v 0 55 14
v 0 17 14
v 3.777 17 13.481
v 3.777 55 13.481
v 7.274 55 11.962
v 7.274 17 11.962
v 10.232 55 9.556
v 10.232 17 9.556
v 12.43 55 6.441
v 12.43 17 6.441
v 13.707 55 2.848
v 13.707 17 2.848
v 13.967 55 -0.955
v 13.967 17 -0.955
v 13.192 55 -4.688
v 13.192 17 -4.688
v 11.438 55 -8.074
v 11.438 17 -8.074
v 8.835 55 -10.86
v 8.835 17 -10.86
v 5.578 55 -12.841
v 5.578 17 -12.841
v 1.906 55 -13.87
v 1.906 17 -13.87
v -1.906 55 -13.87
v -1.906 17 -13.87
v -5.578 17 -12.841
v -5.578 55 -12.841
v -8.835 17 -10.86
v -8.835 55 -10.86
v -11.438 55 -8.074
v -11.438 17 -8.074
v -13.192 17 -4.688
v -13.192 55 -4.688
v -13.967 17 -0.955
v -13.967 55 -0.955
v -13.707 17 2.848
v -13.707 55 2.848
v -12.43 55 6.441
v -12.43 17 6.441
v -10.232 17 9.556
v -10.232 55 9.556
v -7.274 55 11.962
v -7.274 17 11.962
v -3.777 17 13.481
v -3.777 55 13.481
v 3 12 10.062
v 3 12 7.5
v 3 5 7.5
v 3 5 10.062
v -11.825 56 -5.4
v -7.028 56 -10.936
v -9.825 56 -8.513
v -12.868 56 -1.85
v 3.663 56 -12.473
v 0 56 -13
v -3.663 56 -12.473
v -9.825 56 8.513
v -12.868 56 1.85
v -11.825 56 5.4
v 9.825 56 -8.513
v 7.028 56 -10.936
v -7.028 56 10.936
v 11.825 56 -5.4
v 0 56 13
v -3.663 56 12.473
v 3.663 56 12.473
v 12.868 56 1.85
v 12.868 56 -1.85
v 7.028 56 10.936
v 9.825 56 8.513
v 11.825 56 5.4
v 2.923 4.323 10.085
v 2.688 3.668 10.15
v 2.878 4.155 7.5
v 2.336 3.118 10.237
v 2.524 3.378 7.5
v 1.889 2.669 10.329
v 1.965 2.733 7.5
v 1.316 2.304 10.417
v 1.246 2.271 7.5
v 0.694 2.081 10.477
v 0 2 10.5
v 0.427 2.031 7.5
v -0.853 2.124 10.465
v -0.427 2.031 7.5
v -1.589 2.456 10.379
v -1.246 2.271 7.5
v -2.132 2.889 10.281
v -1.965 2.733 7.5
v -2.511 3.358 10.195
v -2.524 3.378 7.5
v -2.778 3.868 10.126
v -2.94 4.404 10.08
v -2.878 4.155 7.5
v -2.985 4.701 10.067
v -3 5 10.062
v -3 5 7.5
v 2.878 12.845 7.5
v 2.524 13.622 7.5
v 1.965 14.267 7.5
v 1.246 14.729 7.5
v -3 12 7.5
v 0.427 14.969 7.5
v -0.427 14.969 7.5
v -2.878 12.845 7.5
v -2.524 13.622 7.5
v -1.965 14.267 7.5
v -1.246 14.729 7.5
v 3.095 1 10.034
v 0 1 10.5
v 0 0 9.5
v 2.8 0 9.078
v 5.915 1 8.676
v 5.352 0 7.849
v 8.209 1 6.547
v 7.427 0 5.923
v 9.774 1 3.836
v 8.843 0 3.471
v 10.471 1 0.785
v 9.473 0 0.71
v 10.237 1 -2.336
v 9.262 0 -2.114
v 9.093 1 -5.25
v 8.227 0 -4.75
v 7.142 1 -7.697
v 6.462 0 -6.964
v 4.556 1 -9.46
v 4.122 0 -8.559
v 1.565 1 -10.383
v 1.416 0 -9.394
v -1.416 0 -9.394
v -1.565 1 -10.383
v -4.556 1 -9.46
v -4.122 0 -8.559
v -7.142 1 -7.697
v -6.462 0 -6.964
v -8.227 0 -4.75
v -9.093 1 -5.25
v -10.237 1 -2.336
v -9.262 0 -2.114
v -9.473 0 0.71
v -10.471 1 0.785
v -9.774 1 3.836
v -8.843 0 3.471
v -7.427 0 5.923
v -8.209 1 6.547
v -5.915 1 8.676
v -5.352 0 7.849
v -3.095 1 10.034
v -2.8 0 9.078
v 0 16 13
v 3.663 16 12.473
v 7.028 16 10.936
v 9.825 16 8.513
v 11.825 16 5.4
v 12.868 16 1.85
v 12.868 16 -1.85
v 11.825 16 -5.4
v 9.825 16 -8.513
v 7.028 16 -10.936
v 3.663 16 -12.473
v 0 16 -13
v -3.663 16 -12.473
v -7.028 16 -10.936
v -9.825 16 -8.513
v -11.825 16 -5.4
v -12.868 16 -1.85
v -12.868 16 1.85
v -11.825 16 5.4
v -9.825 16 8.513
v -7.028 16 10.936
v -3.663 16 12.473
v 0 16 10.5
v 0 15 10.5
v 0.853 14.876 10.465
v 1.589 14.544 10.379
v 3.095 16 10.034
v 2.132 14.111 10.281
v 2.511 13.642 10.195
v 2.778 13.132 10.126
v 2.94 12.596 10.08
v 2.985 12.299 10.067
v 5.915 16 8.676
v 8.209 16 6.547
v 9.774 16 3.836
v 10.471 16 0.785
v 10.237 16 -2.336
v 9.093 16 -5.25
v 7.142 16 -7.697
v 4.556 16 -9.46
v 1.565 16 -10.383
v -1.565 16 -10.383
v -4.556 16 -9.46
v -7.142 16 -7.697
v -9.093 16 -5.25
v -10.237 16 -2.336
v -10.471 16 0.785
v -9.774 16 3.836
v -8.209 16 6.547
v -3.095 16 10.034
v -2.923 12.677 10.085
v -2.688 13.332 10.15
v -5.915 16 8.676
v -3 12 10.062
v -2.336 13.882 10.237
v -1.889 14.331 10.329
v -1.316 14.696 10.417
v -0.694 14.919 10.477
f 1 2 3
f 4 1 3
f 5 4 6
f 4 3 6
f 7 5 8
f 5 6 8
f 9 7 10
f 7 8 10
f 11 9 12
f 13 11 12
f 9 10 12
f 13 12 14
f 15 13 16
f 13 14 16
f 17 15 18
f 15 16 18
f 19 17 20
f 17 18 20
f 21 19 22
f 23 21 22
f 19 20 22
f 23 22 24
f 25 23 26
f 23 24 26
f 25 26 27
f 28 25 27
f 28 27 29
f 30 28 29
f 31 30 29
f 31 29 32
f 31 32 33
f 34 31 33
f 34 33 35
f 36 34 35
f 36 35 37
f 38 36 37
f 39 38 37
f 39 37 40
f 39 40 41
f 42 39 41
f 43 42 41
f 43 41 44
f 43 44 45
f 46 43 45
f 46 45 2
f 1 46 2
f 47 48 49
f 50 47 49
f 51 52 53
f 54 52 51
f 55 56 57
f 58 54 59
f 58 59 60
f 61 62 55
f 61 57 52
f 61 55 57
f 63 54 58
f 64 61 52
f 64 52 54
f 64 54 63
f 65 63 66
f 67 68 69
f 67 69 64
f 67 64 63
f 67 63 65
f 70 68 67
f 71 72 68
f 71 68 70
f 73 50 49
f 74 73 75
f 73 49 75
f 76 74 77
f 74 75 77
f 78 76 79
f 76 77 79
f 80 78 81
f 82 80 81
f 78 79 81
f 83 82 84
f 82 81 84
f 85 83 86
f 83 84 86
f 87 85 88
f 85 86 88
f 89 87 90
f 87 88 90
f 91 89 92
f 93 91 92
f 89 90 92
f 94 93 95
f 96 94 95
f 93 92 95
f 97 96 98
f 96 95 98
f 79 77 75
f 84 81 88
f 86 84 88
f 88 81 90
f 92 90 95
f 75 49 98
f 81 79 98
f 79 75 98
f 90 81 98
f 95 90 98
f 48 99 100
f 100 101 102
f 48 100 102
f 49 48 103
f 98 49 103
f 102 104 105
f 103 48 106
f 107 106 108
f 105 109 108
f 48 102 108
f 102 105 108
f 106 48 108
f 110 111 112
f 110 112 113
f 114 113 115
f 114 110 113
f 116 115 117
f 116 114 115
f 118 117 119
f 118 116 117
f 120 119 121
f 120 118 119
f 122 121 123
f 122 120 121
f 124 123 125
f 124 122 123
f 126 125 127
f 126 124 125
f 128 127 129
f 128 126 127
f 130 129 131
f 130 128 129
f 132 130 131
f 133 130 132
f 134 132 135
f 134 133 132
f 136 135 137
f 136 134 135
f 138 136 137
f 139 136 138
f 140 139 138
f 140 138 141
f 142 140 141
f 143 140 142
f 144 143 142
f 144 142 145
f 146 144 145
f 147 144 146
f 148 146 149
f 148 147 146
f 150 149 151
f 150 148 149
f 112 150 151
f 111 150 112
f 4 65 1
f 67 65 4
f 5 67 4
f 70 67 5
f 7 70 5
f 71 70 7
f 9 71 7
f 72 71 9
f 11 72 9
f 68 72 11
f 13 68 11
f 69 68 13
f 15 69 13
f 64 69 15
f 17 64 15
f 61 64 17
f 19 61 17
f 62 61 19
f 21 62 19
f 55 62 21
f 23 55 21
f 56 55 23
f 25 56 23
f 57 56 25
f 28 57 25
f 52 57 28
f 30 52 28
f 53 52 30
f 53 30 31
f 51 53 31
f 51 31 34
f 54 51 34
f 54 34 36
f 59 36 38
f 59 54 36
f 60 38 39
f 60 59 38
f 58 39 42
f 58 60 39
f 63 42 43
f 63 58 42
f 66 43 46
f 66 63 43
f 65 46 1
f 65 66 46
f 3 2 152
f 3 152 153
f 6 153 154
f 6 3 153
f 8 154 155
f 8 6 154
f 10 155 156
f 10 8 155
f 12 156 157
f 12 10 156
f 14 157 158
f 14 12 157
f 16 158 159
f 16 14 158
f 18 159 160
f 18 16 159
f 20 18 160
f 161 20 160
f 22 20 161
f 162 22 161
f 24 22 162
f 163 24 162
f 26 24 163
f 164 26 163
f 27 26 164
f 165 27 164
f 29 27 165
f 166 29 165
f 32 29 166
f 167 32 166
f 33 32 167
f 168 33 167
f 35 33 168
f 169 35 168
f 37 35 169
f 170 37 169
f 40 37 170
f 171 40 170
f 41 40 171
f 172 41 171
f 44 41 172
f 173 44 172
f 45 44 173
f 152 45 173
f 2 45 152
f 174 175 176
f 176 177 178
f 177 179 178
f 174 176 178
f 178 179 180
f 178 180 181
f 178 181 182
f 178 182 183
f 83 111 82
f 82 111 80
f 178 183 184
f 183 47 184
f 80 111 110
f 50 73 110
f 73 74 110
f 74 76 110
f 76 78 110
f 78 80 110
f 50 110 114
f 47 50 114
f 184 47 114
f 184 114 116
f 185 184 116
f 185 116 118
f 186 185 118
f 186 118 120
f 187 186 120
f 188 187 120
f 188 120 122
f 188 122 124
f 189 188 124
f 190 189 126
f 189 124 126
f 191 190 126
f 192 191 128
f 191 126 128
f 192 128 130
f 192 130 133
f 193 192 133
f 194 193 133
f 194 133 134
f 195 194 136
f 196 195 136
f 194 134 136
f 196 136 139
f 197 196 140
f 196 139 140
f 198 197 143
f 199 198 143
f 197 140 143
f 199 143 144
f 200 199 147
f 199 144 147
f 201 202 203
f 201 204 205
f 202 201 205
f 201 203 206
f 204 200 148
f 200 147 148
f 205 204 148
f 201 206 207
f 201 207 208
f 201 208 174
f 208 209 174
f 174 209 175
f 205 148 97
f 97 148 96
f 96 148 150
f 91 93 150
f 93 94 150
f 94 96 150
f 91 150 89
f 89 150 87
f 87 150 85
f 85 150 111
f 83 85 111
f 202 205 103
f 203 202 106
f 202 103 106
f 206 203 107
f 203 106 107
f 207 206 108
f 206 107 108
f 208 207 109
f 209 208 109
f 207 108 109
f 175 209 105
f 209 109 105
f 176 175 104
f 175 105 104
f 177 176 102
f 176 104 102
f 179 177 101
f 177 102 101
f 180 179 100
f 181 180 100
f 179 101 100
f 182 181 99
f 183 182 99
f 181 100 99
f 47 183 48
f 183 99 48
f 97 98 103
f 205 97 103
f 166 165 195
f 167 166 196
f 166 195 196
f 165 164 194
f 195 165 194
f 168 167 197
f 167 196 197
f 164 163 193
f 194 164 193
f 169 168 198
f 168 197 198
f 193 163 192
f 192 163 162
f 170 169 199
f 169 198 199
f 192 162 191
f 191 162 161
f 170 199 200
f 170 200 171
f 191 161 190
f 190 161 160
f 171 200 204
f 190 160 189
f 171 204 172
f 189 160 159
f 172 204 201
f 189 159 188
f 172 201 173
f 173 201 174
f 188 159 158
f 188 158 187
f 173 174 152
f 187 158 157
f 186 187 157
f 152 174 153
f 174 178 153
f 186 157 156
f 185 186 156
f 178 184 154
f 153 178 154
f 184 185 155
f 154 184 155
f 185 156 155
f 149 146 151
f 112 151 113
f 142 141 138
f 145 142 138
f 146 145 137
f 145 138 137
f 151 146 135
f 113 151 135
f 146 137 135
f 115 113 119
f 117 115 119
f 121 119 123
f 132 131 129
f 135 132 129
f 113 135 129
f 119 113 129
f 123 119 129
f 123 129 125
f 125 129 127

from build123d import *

# Parameters (mm, degrees)
SKETCH3_R           = 14
BOSS_EXTRUDE2_DEPTH = 56
SKETCH3_4_R         = 14
SKETCH3_4_R_2       = 10.5
CUT_EXTRUDE1_DEPTH  = 16
CHAMFER1_SIZE       = 1
CUT_EXTRUDE2_DEPTH  = 16


with BuildPart() as part:
    # Sketch3 → Boss-Extrude2 (new body)
    with BuildSketch(Plane(origin=(0, 0, 0), x_dir=(1, 0, 0), z_dir=(0, 1, 0))):
        Circle(SKETCH3_R)
    extrude(amount=BOSS_EXTRUDE2_DEPTH)

    # Sketch3<4> → Cut-Extrude1 (cut)
    with BuildSketch(Plane(origin=(0, 0, 0), x_dir=(1, 0, 0), z_dir=(0, 1, 0))):
        Circle(SKETCH3_4_R)
        Circle(SKETCH3_4_R_2, mode=Mode.SUBTRACT)
    extrude(amount=CUT_EXTRUDE1_DEPTH, mode=Mode.SUBTRACT)

    # Chamfer1
    chamfer1_edges = [part.edges().sort_by_distance(p)[0] for p in [
        (-14, 56, 0),
        (-14, 16, 0),
        (-10.5, 0, 0),
    ]]
    chamfer(chamfer1_edges, length=CHAMFER1_SIZE)

    # Sketch5 → Cut-Extrude2 (cut)
    with BuildSketch(Plane.XY.offset(7.5)):
        with BuildLine():
            Line((-3, 5), (-3, 12))
            ThreePointArc((-3, 12), (0, 15), (3, 12))
            Line((3, 12), (3, 5))
            ThreePointArc((3, 5), (0, 2), (-3, 5))
        make_face()
    extrude(amount=CUT_EXTRUDE2_DEPTH, mode=Mode.SUBTRACT)


solid = part.part
